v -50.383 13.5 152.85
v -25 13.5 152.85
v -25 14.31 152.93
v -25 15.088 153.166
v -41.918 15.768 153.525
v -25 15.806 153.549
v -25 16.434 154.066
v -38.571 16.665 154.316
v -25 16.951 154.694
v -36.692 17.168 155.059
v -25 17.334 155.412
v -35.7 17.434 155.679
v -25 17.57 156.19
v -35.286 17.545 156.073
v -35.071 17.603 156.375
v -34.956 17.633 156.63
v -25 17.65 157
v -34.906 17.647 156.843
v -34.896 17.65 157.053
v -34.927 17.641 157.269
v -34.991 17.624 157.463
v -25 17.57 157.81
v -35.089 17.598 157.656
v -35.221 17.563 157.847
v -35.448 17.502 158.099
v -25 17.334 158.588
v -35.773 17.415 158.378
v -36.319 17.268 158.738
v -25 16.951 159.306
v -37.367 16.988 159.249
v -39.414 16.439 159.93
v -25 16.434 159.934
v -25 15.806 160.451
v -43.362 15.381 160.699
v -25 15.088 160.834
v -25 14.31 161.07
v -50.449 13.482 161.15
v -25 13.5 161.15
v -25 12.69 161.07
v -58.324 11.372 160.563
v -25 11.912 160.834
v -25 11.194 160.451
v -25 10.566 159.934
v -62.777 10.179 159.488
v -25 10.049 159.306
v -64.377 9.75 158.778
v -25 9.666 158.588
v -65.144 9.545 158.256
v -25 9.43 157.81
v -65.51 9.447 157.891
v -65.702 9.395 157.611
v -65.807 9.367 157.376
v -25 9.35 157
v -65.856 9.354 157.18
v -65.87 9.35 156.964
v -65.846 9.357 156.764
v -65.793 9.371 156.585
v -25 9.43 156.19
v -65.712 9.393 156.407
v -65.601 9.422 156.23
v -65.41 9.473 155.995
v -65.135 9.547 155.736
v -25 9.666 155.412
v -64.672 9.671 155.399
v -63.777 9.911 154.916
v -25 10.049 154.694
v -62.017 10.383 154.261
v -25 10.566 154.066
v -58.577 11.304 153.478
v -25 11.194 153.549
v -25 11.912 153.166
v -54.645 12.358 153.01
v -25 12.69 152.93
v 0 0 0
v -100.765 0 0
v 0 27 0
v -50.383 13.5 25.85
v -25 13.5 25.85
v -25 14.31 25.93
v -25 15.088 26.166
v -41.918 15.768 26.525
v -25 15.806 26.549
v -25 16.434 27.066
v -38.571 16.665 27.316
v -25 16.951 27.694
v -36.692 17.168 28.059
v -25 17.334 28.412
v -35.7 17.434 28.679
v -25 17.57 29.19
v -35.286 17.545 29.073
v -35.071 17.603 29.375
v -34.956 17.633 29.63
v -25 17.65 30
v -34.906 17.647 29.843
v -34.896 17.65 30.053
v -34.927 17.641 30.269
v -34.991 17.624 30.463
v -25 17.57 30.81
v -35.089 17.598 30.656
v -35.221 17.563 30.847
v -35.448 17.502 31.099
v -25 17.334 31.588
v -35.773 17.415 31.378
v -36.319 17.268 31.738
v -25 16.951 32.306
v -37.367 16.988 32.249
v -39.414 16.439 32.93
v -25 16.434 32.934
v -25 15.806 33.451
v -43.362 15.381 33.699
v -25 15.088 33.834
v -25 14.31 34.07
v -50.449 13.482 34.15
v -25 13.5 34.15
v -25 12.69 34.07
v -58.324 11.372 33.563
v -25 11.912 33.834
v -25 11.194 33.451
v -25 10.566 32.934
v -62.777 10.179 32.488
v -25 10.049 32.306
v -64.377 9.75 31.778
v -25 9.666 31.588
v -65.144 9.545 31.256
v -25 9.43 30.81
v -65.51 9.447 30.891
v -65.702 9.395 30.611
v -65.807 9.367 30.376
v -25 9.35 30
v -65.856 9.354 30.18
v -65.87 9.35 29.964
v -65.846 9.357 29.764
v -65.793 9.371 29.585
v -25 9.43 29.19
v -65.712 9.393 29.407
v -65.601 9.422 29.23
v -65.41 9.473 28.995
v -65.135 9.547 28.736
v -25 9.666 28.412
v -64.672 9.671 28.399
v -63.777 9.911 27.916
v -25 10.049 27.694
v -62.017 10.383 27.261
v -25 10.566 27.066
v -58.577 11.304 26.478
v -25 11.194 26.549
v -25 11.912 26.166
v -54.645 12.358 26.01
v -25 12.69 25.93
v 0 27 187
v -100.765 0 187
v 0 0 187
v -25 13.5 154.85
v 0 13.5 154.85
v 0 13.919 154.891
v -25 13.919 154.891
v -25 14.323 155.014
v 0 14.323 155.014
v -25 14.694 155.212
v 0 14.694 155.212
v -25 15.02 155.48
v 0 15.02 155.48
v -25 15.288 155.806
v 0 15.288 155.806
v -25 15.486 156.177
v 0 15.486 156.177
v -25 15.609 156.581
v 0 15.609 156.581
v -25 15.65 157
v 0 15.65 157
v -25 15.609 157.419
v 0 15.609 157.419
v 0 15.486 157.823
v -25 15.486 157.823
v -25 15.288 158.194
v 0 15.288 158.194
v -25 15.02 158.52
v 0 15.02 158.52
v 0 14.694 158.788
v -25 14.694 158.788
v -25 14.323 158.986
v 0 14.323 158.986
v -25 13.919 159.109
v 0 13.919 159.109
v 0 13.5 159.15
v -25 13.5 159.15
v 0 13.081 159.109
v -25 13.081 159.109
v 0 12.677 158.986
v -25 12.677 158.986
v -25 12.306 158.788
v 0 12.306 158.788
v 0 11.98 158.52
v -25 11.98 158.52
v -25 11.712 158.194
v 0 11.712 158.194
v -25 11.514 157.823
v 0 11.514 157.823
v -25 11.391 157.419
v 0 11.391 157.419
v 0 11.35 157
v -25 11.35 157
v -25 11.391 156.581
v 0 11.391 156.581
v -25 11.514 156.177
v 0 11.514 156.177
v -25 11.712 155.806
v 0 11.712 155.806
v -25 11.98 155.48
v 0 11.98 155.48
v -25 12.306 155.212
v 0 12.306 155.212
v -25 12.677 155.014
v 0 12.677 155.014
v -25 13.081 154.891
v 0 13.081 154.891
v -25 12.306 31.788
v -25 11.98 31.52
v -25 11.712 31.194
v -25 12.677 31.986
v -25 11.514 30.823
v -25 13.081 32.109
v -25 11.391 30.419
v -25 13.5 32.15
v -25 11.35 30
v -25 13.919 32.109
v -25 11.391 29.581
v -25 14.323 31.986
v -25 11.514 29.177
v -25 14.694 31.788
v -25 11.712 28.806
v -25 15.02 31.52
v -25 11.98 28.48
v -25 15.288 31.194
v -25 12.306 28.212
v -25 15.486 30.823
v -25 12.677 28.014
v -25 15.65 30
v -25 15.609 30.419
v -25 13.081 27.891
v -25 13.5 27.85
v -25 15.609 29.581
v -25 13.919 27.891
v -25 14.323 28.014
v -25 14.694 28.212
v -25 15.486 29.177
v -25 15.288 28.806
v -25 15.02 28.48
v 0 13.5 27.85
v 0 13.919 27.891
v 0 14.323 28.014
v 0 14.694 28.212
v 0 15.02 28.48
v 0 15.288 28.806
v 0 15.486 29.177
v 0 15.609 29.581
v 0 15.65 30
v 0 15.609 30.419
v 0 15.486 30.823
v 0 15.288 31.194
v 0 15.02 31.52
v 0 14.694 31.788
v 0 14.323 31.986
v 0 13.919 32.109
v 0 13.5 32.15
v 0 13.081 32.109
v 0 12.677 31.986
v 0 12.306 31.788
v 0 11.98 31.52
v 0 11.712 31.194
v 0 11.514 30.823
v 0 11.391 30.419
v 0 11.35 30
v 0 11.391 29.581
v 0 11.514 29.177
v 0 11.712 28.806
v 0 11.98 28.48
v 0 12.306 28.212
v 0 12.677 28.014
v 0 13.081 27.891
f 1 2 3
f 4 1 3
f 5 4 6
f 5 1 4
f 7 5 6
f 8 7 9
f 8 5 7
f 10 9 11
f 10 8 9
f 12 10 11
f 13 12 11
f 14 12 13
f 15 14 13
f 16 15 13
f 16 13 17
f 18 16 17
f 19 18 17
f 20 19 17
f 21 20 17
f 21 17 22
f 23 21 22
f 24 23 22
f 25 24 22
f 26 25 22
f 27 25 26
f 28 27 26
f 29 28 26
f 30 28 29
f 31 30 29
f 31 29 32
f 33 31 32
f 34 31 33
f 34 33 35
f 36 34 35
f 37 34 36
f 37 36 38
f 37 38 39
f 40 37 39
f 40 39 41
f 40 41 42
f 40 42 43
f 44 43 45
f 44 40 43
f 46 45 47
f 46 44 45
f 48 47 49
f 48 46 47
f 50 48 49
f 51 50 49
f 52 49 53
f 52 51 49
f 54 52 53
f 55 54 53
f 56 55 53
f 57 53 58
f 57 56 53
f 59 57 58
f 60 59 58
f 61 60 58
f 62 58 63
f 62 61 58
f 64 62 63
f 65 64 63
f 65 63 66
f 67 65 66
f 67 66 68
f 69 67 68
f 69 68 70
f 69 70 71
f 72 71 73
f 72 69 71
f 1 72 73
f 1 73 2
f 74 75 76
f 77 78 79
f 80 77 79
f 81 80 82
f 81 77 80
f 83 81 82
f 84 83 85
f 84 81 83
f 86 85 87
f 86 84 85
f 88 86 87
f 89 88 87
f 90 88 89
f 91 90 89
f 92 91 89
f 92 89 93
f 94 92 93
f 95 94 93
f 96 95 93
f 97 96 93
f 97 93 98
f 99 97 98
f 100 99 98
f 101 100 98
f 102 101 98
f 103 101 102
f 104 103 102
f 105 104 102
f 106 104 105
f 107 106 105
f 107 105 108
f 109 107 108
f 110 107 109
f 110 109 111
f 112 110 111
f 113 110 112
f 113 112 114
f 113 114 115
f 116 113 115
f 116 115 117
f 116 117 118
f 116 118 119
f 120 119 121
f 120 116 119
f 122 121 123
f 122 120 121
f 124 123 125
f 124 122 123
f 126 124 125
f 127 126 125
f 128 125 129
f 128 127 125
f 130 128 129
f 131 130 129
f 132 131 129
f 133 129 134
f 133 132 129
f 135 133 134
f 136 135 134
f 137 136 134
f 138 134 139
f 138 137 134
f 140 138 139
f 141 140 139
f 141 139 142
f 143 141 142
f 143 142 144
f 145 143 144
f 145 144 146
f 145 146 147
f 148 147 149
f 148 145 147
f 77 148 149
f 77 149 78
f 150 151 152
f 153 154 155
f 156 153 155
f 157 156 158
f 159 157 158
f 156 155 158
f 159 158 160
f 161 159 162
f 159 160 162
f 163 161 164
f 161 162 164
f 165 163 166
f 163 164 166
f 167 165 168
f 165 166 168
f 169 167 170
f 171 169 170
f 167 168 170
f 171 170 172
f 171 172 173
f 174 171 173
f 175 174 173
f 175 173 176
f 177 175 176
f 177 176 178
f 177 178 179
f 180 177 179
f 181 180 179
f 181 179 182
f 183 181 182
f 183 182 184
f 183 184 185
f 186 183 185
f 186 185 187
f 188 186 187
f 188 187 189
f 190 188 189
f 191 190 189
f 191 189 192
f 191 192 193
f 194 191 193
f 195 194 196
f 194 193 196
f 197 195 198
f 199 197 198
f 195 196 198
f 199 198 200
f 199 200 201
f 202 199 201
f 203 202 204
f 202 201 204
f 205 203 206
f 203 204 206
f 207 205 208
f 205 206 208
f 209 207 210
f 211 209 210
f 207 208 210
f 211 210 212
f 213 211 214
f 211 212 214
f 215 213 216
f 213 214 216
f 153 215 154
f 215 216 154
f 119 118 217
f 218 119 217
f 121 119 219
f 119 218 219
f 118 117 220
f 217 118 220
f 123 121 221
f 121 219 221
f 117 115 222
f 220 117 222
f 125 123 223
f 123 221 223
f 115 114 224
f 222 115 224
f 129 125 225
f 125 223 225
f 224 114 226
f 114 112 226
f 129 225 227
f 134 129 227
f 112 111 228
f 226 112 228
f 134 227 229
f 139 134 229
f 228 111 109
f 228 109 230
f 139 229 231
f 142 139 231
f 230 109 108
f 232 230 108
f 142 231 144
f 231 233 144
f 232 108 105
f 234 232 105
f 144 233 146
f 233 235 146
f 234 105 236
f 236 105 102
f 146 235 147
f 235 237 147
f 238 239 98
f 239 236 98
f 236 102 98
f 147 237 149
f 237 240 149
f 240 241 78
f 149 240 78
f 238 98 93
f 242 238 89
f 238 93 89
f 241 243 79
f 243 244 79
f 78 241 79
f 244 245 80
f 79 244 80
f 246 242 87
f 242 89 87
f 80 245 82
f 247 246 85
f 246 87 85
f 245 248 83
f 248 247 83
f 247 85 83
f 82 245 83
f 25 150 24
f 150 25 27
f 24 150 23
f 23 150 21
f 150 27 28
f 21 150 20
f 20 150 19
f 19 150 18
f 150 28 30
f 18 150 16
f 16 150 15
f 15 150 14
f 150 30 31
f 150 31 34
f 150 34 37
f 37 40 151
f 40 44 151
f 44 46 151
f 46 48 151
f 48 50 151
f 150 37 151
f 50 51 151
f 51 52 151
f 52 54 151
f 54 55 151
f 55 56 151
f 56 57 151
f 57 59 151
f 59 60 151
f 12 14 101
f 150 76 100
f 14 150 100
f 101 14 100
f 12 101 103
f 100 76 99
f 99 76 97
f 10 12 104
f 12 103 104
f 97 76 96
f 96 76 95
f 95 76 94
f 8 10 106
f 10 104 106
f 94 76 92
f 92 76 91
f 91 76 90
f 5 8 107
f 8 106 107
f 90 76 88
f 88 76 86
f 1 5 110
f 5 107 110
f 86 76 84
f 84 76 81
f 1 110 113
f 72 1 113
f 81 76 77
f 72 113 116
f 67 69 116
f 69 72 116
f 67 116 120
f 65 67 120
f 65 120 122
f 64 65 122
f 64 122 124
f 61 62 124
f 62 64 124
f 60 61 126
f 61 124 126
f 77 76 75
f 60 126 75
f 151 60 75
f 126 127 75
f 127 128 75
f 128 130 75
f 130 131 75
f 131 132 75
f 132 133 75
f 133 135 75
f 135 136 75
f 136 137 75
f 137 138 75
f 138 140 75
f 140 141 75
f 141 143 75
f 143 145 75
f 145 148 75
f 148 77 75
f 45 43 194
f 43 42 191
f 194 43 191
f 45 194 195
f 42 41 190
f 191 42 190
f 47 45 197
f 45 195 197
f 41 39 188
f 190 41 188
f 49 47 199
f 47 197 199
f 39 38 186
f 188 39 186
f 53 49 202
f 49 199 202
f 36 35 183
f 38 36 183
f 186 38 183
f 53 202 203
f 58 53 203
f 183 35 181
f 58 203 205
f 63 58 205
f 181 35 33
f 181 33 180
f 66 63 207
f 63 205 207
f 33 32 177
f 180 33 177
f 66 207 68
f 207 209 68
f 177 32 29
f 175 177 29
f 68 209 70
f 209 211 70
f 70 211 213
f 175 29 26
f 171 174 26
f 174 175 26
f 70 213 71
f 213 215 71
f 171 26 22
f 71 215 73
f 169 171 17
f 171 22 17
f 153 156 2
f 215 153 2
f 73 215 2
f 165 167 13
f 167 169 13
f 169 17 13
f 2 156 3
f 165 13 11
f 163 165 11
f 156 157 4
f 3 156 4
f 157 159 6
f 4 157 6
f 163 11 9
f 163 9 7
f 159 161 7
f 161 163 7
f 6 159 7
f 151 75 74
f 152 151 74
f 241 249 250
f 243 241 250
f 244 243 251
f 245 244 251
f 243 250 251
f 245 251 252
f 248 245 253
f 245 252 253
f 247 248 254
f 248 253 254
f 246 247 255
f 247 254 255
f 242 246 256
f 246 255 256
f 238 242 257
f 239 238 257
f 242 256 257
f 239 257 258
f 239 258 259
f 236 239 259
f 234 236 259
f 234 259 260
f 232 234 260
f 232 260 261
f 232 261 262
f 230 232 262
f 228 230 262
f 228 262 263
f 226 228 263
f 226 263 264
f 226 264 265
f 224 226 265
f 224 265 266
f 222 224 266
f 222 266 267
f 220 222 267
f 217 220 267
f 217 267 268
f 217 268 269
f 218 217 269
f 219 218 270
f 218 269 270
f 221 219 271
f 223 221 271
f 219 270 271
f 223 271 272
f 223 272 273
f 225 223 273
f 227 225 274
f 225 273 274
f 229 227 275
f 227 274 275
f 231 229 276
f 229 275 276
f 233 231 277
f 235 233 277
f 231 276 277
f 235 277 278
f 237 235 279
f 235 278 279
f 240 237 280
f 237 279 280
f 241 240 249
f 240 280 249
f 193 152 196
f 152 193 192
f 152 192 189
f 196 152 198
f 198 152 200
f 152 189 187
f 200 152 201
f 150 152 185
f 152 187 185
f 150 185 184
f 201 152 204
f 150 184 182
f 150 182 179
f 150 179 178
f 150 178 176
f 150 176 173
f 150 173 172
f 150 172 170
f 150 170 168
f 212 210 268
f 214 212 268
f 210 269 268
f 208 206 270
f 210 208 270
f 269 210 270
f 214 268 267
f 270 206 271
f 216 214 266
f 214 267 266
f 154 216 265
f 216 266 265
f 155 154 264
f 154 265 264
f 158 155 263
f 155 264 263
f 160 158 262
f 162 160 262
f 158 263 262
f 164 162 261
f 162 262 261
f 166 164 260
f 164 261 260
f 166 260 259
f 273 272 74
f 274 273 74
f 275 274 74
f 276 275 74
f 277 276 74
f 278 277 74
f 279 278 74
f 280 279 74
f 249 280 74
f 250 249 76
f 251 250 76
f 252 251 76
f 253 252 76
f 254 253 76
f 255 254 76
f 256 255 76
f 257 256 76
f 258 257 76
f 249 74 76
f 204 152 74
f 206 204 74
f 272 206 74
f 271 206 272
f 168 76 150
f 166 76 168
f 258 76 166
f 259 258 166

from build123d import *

# Parameters (mm, degrees)
RESSALTO_EXTRUS_O1_DEPTH = 187
ESBO_O6_R                = 2.15
CORTE_EXTRUS_O1_DEPTH    = 101.765371804
ESBO_O8_R                = 4.15
CORTE_EXTRUS_O2_DEPTH    = 75


with BuildPart() as part:
    # Esboço1 → Ressalto-extrusão1 (new body)
    with BuildSketch(Plane.XY):
        Polygon((0, 0), (0, 27), (-100.765371804, 0), align=None)
    extrude(amount=RESSALTO_EXTRUS_O1_DEPTH)

    # Esboço6 → Corte-extrusão1 (cut, through all)
    with BuildSketch(Plane(origin=(0, 0, 0), x_dir=(0, 0, -1), z_dir=(1, 0, 0))):
        with Locations((-30, 13.5)):
            Circle(ESBO_O6_R)
        with Locations((-157, 13.5)):
            Circle(ESBO_O6_R)
    extrude(amount=-CORTE_EXTRUS_O1_DEPTH, mode=Mode.SUBTRACT)

    # Esboço8 → Corte-extrusão2 (cut)
    with BuildSketch(Plane(origin=(-100, 0, 0), x_dir=(0, 0, -1), z_dir=(1, 0, 0))):
        with Locations((-30, 13.5)):
            Circle(ESBO_O8_R)
        with Locations((-157, 13.5)):
            Circle(ESBO_O8_R)
    extrude(amount=CORTE_EXTRUS_O2_DEPTH, mode=Mode.SUBTRACT)


solid = part.part
